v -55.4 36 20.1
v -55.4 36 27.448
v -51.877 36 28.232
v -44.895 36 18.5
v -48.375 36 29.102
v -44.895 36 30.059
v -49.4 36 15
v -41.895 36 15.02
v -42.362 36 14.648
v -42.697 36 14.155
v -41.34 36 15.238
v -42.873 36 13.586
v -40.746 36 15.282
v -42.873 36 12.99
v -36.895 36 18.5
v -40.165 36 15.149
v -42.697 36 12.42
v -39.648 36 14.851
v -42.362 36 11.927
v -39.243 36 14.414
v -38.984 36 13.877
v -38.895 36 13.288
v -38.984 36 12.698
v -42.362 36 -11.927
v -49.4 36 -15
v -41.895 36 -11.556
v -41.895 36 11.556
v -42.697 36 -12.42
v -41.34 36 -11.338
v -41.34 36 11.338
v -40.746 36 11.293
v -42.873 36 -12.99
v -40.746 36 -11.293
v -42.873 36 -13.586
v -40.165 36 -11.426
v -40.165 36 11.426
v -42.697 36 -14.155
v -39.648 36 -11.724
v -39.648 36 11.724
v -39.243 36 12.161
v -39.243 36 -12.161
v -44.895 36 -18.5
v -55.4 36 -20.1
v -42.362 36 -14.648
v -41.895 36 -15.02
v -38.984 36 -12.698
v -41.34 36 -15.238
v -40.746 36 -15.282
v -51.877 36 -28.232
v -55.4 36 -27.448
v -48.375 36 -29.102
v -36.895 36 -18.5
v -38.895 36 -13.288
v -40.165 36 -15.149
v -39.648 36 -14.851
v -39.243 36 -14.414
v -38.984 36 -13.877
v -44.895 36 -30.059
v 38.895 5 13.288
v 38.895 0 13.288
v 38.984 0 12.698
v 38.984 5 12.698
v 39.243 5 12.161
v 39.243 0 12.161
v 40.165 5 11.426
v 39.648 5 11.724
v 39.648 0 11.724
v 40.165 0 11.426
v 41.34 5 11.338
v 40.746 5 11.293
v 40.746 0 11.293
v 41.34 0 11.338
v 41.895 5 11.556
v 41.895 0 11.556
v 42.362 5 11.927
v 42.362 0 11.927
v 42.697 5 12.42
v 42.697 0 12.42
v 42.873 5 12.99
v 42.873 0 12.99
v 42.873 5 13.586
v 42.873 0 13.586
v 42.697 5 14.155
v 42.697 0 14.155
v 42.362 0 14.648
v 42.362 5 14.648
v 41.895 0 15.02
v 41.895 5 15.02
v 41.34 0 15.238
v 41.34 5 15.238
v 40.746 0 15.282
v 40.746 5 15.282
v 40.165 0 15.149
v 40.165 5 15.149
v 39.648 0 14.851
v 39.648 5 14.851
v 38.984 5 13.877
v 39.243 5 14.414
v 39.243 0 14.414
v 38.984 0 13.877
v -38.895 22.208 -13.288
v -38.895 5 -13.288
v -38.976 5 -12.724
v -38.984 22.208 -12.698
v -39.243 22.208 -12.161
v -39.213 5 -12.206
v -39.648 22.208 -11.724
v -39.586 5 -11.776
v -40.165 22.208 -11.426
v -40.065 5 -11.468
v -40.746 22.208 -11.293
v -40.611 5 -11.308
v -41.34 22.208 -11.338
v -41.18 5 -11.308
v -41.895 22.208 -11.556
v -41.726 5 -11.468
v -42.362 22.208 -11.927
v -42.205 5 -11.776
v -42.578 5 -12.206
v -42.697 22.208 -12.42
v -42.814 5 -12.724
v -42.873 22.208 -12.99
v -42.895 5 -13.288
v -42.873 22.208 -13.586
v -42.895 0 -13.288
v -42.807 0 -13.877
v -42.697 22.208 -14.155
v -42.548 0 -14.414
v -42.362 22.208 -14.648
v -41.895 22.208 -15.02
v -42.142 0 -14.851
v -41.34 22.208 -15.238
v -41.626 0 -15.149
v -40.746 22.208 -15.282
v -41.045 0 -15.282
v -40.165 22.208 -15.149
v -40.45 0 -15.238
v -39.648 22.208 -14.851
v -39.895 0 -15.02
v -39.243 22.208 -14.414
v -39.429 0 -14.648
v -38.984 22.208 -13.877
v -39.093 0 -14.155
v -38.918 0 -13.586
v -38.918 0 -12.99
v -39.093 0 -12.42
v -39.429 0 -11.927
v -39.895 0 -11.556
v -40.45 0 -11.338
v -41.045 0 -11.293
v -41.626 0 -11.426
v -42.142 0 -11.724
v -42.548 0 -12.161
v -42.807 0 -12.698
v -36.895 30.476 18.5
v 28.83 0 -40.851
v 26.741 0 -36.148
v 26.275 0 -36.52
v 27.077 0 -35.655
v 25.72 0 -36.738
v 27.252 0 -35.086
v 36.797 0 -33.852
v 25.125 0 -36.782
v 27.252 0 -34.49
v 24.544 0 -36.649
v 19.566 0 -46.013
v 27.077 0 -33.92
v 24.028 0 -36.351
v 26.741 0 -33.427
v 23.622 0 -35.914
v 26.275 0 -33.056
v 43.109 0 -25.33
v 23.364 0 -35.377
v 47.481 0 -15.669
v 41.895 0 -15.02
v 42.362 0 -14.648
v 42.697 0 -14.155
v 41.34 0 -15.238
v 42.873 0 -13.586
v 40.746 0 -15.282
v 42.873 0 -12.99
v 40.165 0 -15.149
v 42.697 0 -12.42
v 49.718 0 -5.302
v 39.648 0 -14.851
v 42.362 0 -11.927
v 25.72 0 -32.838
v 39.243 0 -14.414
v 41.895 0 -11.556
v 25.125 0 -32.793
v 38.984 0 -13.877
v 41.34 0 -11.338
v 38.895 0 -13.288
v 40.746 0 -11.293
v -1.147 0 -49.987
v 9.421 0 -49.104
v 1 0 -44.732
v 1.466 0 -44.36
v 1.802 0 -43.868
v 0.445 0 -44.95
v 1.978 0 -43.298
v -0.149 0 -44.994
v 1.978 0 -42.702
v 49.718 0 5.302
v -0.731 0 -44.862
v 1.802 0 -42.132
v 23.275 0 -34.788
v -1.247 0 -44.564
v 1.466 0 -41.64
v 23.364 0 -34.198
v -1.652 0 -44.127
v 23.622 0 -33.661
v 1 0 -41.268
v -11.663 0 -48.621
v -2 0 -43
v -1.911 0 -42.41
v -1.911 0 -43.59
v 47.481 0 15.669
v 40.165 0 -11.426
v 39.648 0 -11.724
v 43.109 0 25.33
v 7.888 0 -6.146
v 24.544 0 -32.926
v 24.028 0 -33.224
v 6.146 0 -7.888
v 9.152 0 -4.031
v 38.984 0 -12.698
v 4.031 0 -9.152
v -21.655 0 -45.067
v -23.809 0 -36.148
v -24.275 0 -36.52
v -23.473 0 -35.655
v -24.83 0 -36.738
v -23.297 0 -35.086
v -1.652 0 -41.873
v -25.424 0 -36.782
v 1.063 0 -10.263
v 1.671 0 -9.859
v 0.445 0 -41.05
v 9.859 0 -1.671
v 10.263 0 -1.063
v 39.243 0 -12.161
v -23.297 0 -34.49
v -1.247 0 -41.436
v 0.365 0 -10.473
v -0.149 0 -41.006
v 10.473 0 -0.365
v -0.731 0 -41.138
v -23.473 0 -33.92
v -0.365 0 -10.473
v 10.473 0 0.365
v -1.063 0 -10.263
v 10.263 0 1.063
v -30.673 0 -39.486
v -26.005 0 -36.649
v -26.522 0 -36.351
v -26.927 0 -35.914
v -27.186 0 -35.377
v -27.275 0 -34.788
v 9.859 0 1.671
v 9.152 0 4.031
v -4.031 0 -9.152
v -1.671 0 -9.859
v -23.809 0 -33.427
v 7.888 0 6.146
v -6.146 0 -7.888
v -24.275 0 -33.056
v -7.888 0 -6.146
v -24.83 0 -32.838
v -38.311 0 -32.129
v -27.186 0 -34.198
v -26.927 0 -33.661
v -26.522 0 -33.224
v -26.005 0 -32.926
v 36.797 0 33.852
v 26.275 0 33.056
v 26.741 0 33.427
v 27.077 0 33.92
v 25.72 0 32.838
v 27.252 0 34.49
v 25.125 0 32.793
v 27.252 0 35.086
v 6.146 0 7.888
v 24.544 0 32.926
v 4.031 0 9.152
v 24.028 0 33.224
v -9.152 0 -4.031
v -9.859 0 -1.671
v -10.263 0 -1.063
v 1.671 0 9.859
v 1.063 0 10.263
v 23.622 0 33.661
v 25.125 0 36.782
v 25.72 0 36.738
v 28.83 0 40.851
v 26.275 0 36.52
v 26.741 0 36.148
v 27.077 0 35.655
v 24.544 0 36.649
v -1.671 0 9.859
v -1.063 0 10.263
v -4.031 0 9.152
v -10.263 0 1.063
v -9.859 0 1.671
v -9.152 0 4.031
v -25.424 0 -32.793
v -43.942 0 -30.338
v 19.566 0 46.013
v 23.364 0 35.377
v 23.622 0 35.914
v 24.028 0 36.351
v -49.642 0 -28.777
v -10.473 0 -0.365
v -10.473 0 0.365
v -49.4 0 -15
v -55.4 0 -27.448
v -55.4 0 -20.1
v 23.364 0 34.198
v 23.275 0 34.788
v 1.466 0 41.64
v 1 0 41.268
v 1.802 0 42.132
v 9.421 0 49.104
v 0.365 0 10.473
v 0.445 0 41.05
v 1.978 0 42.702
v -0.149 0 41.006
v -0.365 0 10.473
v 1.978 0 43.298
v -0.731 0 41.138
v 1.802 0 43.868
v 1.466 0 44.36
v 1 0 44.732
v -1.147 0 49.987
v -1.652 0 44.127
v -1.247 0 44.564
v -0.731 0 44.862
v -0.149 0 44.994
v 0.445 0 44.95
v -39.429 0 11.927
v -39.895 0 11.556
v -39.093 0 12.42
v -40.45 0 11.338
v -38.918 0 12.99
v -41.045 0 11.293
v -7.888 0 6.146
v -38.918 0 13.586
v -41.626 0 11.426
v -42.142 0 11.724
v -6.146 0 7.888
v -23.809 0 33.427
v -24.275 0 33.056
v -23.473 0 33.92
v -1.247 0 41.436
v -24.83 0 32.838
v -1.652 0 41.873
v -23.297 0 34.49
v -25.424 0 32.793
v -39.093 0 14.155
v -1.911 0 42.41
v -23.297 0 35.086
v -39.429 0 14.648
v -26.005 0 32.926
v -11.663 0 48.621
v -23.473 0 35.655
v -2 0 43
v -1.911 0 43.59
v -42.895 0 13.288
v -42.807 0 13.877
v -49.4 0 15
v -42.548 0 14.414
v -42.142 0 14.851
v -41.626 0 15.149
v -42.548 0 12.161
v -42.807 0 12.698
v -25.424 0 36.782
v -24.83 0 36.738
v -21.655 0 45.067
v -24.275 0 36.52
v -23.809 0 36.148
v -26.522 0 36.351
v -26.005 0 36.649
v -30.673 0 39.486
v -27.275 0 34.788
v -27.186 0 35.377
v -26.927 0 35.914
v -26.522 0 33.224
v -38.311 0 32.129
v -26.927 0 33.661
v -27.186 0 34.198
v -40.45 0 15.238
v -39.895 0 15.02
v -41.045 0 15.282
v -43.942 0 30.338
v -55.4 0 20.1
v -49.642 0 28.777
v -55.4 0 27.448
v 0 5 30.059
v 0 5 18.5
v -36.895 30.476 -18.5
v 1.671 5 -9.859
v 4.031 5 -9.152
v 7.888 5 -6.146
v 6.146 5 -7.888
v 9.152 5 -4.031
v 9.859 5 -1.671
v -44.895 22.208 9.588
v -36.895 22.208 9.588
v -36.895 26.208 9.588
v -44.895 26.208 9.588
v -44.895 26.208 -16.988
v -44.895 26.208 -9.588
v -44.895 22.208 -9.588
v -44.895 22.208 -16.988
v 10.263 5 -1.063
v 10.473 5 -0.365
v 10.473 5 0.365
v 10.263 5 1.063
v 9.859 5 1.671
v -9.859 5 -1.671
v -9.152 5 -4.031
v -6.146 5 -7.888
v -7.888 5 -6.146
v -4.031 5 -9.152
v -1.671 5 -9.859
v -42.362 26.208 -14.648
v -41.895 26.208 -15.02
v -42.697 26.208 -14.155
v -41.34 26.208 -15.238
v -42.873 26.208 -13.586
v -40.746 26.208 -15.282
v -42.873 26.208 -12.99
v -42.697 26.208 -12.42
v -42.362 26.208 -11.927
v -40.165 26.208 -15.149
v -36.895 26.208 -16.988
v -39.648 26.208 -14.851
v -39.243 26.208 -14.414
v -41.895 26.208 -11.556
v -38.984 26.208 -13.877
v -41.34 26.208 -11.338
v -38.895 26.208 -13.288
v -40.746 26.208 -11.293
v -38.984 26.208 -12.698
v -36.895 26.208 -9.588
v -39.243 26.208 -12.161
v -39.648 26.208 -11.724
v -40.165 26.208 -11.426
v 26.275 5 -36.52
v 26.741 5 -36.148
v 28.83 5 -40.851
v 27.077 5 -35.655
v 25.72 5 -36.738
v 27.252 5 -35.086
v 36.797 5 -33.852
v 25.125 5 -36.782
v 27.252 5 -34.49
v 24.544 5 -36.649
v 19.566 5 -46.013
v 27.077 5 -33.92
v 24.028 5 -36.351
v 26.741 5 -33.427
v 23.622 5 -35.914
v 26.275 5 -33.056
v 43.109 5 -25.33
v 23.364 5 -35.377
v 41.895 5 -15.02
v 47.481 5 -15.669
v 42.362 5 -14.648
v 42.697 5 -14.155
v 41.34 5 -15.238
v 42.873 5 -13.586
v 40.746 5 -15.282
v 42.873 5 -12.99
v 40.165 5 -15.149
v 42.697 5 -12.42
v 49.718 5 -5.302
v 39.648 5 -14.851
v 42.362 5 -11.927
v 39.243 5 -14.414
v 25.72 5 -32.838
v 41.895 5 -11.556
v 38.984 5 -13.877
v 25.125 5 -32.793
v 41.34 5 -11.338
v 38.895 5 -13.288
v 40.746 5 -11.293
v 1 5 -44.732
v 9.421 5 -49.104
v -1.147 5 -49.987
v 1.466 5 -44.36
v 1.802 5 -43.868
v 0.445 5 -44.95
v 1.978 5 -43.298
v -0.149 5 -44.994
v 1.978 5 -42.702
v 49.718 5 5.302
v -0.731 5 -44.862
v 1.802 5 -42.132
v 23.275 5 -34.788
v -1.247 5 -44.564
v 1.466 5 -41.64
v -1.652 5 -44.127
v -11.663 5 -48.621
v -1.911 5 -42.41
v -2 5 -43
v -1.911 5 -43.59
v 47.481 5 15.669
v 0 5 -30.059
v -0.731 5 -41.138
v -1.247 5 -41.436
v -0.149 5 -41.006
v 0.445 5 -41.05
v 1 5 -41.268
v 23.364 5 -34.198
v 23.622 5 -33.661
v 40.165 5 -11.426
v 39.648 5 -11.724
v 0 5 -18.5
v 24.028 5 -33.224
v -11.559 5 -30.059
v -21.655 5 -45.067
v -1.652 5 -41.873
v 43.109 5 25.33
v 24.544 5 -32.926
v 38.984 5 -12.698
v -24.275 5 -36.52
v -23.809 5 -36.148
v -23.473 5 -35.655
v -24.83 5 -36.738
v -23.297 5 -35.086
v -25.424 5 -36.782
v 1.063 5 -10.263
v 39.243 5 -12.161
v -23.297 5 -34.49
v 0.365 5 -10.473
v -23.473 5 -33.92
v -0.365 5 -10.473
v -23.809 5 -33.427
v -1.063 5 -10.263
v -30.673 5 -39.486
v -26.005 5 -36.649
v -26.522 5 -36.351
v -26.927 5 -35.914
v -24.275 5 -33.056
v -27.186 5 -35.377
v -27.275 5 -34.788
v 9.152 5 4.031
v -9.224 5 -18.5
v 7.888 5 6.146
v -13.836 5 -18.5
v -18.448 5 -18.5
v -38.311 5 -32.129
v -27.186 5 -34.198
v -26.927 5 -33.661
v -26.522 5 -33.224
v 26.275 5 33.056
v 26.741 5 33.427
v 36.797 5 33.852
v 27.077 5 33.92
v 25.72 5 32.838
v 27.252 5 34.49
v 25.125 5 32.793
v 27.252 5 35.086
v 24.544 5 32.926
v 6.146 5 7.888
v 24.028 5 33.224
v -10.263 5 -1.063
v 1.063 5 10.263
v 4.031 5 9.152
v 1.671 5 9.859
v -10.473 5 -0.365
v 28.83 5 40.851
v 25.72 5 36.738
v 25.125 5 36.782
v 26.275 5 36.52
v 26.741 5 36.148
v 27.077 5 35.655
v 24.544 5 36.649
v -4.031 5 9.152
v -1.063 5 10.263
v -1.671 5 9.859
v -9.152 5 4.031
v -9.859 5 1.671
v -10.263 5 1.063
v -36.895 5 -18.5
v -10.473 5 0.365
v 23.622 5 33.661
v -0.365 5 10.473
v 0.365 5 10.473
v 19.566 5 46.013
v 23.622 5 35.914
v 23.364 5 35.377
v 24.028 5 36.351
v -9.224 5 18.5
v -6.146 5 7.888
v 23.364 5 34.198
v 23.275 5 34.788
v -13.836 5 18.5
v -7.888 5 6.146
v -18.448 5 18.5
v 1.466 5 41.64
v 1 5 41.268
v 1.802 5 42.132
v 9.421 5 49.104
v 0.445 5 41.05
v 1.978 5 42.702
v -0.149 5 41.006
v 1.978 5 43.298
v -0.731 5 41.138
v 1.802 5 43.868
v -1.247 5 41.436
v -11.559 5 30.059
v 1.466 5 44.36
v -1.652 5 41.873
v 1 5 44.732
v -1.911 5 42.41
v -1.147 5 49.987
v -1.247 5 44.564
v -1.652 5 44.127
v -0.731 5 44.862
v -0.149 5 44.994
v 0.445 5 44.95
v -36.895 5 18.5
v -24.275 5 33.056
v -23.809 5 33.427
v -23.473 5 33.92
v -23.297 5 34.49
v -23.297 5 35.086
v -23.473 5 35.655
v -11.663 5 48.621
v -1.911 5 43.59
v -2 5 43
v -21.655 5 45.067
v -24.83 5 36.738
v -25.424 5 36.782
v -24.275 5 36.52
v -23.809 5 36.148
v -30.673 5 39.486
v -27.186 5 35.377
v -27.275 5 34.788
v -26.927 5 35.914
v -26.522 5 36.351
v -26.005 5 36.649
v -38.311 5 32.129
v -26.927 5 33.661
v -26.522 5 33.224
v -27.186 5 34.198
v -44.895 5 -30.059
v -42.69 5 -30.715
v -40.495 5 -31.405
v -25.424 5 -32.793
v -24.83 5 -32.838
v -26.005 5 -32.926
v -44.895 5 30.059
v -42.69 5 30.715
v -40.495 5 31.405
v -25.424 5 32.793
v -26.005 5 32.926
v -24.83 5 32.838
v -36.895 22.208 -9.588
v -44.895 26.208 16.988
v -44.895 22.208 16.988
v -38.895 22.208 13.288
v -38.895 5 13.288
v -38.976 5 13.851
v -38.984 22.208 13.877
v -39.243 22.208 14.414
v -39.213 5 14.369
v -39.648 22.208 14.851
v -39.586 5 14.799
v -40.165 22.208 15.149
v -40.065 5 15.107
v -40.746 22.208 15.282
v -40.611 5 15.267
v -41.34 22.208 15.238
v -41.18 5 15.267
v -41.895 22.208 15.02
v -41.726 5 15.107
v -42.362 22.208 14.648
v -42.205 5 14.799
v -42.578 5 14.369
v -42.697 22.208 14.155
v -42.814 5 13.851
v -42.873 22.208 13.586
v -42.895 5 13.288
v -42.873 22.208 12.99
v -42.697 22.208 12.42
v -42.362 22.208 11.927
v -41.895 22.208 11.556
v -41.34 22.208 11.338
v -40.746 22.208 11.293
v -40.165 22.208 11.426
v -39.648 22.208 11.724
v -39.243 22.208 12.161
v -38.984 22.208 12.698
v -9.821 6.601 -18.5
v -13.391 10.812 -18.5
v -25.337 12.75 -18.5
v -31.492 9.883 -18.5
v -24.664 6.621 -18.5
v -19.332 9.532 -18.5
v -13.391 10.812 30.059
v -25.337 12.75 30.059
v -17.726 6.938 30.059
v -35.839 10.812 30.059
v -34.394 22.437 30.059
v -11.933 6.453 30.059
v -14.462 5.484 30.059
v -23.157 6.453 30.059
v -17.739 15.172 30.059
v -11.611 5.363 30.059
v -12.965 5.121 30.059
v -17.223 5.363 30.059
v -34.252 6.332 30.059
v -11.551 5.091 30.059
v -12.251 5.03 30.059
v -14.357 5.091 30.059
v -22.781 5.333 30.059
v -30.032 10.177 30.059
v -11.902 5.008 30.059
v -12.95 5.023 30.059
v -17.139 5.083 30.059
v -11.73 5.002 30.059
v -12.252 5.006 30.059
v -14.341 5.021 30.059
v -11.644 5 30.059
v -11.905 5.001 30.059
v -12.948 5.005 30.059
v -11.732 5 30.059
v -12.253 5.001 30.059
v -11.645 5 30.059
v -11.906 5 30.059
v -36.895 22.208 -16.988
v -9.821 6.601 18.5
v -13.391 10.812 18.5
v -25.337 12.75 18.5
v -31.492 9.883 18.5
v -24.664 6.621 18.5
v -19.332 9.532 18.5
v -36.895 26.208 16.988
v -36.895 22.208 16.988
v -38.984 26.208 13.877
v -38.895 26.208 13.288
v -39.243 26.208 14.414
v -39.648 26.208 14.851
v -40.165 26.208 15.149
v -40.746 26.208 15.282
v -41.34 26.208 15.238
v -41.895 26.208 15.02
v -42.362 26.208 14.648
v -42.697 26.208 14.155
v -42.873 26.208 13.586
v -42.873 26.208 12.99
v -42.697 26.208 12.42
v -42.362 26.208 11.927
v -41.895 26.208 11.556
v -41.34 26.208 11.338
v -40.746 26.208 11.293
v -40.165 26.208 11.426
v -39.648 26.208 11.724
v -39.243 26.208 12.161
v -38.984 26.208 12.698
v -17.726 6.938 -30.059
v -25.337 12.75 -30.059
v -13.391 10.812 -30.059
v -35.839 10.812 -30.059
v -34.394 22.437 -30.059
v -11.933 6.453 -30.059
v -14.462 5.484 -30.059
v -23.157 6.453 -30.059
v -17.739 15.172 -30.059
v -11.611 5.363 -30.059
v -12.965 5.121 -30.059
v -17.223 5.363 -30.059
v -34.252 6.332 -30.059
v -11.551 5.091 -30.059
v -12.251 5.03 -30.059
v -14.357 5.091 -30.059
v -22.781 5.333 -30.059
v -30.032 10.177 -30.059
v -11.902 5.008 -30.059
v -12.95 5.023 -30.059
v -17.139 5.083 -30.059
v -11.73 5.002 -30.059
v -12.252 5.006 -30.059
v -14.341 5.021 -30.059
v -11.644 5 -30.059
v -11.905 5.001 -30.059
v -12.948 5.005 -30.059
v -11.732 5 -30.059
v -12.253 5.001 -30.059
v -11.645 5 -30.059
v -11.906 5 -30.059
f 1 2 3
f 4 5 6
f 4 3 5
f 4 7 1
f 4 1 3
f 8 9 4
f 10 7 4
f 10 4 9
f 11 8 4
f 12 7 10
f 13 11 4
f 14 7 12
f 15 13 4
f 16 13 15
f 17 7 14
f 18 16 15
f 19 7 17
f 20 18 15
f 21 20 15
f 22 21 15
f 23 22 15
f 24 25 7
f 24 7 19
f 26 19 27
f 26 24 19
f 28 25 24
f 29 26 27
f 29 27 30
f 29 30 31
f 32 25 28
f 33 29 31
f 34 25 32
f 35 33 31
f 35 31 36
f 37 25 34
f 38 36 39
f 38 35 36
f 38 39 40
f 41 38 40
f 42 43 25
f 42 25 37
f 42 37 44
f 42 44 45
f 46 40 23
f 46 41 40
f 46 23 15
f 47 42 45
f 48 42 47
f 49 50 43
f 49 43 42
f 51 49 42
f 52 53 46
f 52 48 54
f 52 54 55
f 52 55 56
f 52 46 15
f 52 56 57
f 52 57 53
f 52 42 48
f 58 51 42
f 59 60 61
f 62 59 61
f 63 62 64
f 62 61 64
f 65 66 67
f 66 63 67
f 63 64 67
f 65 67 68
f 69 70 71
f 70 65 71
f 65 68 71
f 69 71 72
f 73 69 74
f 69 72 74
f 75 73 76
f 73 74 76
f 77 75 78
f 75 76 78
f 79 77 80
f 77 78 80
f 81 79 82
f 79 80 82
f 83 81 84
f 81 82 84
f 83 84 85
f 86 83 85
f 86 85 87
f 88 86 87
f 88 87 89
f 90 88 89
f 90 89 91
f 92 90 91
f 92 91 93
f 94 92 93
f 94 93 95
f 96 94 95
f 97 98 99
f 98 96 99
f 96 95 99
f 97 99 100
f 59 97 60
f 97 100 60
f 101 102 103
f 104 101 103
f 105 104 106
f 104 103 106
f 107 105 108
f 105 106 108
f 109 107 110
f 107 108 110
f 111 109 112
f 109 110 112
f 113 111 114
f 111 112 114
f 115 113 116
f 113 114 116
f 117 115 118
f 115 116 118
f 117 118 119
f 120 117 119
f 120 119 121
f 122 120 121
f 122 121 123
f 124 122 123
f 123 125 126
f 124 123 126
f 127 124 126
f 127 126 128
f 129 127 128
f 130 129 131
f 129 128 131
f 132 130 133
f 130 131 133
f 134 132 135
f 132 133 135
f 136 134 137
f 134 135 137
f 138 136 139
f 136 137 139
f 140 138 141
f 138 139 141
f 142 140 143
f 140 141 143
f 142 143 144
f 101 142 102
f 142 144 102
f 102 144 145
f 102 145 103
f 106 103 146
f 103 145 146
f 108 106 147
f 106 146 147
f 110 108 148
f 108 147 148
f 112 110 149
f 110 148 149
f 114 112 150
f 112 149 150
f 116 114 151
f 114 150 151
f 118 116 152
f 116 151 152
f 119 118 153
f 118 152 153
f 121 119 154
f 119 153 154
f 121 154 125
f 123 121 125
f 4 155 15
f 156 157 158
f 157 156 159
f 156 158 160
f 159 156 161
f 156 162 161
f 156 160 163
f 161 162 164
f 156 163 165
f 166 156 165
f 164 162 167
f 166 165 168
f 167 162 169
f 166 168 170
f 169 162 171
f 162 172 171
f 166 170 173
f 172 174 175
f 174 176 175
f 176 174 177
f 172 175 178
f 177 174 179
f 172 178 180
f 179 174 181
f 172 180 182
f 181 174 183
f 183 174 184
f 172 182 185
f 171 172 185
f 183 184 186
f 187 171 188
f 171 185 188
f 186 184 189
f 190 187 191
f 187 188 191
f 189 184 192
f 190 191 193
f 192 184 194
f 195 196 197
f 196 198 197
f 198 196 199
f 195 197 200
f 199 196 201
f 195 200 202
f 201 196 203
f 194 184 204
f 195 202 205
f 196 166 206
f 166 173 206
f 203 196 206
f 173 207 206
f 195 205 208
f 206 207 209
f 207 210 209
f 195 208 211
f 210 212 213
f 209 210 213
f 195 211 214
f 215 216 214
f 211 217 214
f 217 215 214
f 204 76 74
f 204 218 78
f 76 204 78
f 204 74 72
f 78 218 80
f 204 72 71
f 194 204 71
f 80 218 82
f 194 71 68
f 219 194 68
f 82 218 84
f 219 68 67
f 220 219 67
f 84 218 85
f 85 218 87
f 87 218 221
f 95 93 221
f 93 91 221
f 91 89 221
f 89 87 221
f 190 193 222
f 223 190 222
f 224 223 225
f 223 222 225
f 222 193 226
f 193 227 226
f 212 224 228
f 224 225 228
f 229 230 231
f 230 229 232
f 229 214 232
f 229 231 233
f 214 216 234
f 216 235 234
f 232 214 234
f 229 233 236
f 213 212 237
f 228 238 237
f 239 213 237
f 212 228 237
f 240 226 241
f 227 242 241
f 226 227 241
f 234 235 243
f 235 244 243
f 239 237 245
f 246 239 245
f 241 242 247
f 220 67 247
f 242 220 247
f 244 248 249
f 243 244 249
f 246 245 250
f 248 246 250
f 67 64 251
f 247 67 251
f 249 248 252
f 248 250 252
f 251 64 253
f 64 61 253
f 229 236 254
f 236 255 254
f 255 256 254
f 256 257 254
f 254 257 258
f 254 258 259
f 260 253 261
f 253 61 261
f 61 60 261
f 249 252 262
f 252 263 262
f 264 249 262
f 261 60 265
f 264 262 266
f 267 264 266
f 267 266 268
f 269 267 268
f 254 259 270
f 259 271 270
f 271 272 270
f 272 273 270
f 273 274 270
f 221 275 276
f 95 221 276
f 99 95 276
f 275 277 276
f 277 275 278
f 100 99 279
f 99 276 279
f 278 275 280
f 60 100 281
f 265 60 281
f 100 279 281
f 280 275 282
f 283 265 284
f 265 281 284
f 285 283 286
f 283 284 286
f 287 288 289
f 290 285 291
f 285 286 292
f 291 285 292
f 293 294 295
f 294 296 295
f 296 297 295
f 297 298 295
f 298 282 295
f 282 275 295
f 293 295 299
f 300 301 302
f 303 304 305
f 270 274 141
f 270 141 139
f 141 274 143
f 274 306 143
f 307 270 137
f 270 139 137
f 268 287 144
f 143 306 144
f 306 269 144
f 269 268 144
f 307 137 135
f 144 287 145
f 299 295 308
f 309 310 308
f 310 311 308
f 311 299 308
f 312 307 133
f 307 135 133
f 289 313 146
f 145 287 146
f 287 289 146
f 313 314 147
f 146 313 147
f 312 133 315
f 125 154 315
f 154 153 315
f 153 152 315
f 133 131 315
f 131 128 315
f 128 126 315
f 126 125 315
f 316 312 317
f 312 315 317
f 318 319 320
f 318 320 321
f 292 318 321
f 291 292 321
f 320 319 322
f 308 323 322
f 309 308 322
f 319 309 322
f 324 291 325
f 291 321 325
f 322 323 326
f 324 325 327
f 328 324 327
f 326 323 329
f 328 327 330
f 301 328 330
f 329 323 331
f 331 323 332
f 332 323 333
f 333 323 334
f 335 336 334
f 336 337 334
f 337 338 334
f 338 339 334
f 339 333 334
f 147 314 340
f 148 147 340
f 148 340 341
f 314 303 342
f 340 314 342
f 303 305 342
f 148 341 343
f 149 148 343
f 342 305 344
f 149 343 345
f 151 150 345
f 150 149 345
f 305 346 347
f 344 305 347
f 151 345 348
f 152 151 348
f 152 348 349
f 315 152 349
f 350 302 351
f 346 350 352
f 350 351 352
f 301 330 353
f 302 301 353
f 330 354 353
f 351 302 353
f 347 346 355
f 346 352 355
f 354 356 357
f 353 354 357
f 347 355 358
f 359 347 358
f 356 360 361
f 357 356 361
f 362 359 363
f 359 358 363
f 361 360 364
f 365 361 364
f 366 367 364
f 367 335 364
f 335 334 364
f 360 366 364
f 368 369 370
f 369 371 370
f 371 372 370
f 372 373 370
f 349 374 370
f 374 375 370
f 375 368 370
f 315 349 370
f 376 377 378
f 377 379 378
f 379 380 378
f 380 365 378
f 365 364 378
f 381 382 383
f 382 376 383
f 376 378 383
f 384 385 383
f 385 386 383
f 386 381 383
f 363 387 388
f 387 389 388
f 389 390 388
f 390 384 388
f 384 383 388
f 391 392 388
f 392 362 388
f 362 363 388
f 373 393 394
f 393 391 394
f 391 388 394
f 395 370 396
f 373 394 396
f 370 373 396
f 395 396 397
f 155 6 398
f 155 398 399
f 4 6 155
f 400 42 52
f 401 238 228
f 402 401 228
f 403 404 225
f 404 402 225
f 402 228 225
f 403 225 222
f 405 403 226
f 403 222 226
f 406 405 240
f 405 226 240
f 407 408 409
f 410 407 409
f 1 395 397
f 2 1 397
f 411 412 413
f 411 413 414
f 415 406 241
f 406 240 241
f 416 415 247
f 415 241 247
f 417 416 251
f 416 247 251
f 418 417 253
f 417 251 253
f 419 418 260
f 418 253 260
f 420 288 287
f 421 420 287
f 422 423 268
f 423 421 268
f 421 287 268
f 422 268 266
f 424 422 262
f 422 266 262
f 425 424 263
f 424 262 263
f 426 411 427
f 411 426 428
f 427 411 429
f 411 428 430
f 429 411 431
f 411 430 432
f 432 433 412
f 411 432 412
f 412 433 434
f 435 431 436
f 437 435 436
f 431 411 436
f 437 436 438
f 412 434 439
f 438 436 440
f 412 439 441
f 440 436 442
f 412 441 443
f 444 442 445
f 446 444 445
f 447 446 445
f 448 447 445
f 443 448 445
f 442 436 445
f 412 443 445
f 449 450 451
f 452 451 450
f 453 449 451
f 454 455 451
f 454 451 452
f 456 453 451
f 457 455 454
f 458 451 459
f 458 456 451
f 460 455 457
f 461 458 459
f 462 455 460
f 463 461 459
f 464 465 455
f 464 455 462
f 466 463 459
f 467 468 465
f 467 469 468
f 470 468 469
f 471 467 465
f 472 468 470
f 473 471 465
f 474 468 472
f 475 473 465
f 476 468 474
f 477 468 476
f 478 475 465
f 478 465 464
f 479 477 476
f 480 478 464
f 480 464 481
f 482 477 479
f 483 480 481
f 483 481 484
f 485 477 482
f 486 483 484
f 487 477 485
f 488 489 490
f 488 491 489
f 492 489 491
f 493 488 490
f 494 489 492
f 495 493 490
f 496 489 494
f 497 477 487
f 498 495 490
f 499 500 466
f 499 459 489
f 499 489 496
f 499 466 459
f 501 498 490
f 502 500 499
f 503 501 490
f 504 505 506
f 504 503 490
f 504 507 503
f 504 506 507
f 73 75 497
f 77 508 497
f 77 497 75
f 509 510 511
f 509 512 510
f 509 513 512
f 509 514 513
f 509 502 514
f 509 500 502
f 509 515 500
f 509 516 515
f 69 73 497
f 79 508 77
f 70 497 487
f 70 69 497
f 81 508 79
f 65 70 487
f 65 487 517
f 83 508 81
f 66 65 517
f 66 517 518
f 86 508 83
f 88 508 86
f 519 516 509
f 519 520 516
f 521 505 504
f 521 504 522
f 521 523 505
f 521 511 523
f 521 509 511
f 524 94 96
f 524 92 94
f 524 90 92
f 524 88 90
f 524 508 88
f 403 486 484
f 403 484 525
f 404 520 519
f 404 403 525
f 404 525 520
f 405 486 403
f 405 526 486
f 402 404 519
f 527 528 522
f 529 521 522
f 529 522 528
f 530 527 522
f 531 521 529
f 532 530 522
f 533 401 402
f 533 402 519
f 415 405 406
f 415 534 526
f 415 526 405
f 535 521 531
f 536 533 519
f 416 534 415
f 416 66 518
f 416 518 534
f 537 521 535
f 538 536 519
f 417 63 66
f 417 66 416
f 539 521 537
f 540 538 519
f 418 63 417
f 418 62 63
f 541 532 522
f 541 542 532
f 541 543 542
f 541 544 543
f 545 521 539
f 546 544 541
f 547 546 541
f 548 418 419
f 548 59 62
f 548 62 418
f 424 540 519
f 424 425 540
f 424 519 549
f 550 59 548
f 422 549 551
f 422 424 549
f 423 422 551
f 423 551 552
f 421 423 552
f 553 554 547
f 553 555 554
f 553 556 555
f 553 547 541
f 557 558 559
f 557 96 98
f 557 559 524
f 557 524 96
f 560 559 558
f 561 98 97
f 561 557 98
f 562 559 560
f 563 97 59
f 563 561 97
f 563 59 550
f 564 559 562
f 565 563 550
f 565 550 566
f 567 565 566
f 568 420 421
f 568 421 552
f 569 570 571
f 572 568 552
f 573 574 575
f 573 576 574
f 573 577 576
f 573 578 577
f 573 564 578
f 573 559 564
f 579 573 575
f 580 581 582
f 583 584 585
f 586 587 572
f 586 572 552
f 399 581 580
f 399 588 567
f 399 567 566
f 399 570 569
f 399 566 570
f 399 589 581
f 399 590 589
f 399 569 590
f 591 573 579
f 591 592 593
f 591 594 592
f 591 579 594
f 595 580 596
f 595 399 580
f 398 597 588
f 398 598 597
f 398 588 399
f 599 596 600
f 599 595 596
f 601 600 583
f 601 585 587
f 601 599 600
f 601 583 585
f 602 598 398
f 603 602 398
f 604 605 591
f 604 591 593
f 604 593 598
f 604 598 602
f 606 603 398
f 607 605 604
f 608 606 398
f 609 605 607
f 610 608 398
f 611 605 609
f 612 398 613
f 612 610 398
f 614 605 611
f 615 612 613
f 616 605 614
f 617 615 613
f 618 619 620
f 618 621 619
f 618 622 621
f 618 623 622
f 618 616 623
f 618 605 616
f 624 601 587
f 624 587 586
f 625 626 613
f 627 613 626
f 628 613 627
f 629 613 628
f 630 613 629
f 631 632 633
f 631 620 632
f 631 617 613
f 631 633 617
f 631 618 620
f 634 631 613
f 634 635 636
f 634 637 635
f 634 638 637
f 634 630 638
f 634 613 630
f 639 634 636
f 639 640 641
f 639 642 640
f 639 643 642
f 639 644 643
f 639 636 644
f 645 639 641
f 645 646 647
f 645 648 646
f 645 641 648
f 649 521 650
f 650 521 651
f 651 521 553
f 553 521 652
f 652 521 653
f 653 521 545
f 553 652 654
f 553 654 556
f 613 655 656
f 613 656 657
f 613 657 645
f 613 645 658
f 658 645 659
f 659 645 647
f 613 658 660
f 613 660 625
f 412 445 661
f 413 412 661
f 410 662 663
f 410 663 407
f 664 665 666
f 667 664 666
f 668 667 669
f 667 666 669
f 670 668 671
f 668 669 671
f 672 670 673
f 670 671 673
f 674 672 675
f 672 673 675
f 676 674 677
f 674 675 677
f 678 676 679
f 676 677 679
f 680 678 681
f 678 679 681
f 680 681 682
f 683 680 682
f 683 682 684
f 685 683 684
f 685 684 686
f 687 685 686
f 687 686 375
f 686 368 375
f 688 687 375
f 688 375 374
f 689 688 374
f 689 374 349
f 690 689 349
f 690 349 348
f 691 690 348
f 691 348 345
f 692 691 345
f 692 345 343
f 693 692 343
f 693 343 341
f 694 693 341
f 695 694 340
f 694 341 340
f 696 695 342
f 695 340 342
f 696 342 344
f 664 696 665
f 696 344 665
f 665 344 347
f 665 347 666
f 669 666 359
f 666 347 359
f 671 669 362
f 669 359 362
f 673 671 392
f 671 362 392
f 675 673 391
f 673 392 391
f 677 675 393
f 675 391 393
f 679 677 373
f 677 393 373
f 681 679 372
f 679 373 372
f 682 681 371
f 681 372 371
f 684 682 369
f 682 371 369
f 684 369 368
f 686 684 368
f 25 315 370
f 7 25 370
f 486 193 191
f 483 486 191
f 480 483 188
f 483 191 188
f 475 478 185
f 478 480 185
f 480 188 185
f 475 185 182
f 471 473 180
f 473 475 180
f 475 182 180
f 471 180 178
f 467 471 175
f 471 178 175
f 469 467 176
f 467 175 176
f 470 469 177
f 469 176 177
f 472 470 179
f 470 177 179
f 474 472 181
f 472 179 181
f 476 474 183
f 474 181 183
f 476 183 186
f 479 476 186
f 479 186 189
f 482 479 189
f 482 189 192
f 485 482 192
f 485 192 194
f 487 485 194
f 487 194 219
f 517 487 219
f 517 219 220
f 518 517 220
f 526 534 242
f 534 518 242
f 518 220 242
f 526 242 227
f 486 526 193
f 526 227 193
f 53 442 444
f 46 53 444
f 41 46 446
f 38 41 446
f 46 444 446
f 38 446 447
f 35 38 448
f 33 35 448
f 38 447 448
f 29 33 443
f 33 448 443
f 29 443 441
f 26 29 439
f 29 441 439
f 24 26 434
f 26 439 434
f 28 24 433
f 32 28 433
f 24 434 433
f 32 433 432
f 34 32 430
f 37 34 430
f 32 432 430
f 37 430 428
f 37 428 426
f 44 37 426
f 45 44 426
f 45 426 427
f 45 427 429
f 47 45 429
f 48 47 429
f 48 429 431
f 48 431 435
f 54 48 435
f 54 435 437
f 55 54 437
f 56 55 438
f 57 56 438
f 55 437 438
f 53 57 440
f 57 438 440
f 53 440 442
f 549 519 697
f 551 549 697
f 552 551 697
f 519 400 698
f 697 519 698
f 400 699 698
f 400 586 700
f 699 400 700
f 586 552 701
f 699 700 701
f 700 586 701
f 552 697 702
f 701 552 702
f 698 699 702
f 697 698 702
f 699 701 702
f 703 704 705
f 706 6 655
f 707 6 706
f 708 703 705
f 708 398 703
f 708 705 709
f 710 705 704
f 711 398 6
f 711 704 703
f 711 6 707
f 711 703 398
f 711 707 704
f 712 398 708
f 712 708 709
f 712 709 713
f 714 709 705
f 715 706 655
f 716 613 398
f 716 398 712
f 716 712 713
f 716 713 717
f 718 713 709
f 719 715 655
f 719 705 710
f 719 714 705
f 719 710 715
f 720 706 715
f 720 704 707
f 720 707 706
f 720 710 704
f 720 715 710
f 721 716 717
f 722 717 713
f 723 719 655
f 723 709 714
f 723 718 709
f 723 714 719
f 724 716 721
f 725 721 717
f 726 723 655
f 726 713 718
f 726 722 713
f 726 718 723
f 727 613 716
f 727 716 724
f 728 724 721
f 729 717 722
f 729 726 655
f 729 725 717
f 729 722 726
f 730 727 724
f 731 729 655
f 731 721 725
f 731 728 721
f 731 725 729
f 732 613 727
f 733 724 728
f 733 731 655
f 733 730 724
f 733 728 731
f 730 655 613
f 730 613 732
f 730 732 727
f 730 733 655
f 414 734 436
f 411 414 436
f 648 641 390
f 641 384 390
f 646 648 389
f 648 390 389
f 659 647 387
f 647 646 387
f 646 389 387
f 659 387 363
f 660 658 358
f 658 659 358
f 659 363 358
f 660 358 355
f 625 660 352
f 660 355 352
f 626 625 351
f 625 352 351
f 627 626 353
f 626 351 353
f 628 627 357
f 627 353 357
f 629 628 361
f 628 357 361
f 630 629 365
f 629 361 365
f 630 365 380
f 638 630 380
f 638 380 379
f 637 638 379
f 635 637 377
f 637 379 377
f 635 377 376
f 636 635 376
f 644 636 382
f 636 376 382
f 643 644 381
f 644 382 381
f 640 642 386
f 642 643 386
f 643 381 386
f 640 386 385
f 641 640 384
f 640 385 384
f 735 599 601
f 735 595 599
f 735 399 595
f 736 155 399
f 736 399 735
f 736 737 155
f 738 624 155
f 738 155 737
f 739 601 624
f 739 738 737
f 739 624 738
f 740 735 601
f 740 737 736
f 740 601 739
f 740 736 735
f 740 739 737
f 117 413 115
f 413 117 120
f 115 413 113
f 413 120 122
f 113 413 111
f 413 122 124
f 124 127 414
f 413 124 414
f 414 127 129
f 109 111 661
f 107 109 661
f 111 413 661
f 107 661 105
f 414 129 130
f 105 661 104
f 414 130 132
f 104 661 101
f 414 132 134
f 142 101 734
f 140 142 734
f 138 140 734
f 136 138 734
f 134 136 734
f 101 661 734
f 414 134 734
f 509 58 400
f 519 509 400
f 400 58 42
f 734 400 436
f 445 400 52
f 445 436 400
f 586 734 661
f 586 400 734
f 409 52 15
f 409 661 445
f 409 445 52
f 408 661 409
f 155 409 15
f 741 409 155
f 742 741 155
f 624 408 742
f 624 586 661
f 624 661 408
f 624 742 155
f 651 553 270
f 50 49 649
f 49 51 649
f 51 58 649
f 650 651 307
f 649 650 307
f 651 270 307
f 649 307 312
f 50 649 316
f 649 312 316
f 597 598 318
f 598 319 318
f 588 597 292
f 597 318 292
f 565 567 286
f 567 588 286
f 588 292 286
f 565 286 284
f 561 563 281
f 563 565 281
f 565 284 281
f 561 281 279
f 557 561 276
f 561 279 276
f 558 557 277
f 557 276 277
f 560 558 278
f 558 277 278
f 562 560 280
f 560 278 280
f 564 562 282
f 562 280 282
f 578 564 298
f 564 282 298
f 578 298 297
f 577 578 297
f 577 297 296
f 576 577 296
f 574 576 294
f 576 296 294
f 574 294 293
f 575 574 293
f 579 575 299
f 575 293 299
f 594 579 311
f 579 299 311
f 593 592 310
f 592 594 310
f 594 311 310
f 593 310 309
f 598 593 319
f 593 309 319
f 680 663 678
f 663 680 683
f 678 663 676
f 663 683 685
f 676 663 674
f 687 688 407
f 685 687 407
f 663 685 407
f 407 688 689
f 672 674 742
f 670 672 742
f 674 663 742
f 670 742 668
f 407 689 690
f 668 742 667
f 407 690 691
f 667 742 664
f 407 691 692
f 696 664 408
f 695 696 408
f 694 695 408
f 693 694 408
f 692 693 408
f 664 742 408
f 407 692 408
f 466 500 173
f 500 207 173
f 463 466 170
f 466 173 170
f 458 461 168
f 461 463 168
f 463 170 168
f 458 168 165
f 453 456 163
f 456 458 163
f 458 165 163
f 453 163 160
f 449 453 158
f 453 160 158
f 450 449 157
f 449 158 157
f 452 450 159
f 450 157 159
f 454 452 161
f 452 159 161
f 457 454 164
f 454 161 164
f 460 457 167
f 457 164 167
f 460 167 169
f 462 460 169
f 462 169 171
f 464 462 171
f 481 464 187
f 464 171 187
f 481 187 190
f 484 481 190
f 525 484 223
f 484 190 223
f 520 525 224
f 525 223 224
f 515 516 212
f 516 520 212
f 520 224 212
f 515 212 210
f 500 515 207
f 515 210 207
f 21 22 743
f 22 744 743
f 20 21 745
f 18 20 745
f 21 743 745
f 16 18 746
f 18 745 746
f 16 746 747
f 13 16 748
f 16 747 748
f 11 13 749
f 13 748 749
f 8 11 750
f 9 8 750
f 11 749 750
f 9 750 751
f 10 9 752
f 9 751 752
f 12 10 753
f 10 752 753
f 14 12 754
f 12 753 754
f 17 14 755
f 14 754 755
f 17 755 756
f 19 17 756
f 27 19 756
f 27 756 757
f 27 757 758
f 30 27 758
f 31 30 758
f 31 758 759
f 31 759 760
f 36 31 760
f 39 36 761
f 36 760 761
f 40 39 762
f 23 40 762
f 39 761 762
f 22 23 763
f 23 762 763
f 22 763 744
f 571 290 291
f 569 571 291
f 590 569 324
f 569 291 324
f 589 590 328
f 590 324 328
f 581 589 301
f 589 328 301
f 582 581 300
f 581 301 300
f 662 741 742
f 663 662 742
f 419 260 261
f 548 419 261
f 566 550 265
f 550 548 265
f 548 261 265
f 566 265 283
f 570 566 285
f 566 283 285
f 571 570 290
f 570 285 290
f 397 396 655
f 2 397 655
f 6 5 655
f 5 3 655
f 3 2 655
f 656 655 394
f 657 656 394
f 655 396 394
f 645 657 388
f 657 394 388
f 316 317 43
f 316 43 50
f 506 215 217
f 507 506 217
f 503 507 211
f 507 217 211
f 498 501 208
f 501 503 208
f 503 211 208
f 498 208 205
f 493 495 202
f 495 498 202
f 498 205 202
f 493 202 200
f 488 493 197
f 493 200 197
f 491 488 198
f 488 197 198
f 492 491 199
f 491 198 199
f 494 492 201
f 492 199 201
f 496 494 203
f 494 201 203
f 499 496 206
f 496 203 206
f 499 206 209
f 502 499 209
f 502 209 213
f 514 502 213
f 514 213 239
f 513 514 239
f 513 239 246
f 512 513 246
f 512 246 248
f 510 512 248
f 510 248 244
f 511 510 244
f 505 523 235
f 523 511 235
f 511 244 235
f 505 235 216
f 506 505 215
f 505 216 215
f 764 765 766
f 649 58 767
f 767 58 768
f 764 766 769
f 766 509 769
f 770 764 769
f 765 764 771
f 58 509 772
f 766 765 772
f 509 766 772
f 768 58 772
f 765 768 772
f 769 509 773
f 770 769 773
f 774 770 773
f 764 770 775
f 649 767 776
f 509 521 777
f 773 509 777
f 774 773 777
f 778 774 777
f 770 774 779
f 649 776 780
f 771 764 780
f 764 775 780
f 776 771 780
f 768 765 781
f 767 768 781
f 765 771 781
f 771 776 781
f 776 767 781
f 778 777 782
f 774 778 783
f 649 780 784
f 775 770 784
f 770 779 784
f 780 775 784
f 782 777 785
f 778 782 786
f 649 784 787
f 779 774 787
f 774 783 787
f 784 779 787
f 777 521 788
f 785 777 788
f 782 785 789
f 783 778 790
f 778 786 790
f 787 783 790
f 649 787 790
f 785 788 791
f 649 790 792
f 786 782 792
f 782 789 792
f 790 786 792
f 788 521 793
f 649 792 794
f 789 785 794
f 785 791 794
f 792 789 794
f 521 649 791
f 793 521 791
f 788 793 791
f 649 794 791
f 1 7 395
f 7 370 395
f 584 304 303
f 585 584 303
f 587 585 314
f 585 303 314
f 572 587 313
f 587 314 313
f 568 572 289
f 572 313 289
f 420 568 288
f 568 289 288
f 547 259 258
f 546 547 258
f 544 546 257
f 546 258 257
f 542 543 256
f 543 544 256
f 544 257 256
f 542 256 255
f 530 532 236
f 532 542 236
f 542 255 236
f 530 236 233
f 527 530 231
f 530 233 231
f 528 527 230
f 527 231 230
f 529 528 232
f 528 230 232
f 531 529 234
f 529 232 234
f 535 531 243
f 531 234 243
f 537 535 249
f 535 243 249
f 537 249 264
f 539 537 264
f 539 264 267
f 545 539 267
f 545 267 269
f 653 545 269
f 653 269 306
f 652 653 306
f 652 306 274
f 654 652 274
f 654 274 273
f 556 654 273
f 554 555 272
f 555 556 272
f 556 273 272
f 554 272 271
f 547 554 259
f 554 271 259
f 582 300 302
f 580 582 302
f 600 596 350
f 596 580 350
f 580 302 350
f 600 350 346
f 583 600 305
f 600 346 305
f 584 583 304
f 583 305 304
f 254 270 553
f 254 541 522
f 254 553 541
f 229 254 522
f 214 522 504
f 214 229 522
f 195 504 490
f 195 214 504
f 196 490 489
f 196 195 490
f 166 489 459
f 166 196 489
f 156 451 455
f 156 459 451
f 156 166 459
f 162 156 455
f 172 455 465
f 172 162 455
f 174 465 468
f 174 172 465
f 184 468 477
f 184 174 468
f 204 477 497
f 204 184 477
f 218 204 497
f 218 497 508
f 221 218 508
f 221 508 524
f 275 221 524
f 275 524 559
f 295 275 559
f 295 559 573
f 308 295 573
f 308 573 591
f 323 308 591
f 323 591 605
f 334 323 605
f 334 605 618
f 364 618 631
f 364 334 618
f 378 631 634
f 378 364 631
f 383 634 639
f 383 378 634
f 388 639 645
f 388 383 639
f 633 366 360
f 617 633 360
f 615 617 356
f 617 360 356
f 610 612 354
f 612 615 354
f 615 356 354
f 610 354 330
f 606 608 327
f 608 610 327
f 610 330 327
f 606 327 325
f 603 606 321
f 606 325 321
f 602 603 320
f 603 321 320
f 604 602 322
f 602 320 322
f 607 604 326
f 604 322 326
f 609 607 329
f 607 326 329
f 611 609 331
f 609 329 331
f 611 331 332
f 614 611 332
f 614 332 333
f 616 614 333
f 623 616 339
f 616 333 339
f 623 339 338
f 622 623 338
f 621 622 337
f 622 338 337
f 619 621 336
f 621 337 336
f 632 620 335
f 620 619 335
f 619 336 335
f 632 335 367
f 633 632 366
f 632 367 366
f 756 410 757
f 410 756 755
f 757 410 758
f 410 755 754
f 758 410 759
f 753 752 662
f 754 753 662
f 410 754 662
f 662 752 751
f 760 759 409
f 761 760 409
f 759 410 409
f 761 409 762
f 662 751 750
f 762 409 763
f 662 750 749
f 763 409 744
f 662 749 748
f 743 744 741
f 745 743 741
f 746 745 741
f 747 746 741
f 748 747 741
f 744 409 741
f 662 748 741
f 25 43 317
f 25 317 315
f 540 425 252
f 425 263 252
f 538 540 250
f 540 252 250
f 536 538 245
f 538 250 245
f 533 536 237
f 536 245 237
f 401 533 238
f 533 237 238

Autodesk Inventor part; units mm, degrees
ref_plane "YZ Plane" through (0, 0, 0) normal (1, 0, 0) x (0, 1, 0)
ref_plane "XZ Plane" through (0, 0, 0) normal (0, 1, 0) x (-1, 0, 0)
sketch "Эскиз12" plane through (0, 0, 0) normal (0, 1, 0) x (-1, 0, 0)
  line L0 (114.5, 15) -> (114.5, 11.5)
  line L1 (114.5, 11.5) -> (114.5, -11.5)
  line L2 (114.5, -11.5) -> (114.5, -15)
  line L3 (114.5, -15) -> (108.5, -20.1)
  line L4 (108.5, -20.1) -> (55.4, -20.1)
  line L5 (55.4, -20.1) -> (49.4, -15)
  line L6 (49.4, -15) -> (49.4, 15)
  line L7 (49.4, 15) -> (55.4, 20.1)
  line L8 (55.4, 20.1) -> (108.5, 20.1)
  line L9 (108.5, 20.1) -> (114.5, 15)
  arc A0 (-1.6711, 9.8594) -> (-9.8594, 1.6711) centre (0, 0) ccw
  arc A1 (1.6711, 9.8594) -> (-1.6711, 9.8594) centre (0, 8) ccw
  arc A2 (9.8594, 1.6711) -> (1.6711, 9.8594) centre (0, 0) ccw
  arc A3 (9.8594, -1.6711) -> (9.8594, 1.6711) centre (8, 0) ccw
  arc A4 (1.6711, -9.8594) -> (9.8594, -1.6711) centre (0, 0) ccw
  arc A5 (-1.6711, -9.8594) -> (1.6711, -9.8594) centre (0, -8) ccw
  arc A6 (-9.8594, -1.6711) -> (-1.6711, -9.8594) centre (0, 0) ccw
  arc A7 (-9.8594, 1.6711) -> (-9.8594, -1.6711) centre (-8, 0) ccw
  circle A8 centre (0, 43) radius 2
  circle A9 centre (-25.2748, 34.7877) radius 2
  circle A10 centre (-40.8954, 13.2877) radius 2
  circle A11 centre (-40.8954, -13.2877) radius 2
  circle A12 centre (-25.2748, -34.7877) radius 2
  circle A13 centre (0, -43) radius 2
  circle A14 centre (25.2748, -34.7877) radius 2
  circle A15 centre (40.8954, -13.2877) radius 2
  circle A16 centre (40.8954, 13.2877) radius 2
  circle A17 centre (25.2748, 34.7877) radius 2
  arc A18 (38.3107, 32.1293) -> (38.3107, -32.1293) centre (0, 0) ccw
  arc A19 (97.8335, -24.9059) -> (38.3107, -32.1293) centre (85.2244, -169.8586) ccw
  arc A20 (97.8335, -24.9059) -> (97.8335, 24.9059) centre (100, 0) ccw
  arc A21 (38.3107, 32.1293) -> (97.8335, 24.9059) centre (85.2244, 169.8586) ccw
  circle A22 centre (52.2, 11) radius 1.025
  circle A23 centre (52.2, -11) radius 1.025
  circle A24 centre (60, -17.3) radius 1.025
  circle A25 centre (60, 17.3) radius 1.025
  line L10 (55, -11.5) -> (55, 11.5)
  arc A26 (58, 14.5) -> (55, 11.5) centre (58, 11.5) ccw
  line L11 (58, 14.5) -> (111.5, 14.5)
  arc A27 (55, -11.5) -> (58, -14.5) centre (58, -11.5) ccw
  line L12 (111.5, -14.5) -> (58, -14.5)
  arc A28 (111.5, -14.5) -> (114.5, -11.5) centre (111.5, -11.5) ccw
  arc A29 (114.5, 11.5) -> (111.5, 14.5) centre (111.5, 11.5) ccw
  line L13 (40.8954, 13.2877) -> (40.8954, -13.2877)
  line L14 (36.8954, 18.5) -> (44.8954, 18.5)
  line L15 (44.8954, 18.5) -> (44.8954, -18.5)
  line L16 (44.8954, -18.5) -> (36.8954, -18.5)
  line L17 (36.8954, -18.5) -> (36.8954, 18.5)
  line L18 (36.8954, 18.5) -> (44.8954, -18.5) construction
  line L19 (44.8954, 18.5) -> (36.8954, -18.5) construction
  line L20 (44.8954, -18.5) -> (44.8954, -30.0593)
  line L21 (55.4, -20.1) -> (55.4, -27.448)
  line L22 (55.4, 20.1) -> (55.4, 27.448)
  line L23 (44.8954, 18.5) -> (44.8954, 30.0593)
  point P0 (40.8954, 0)
  dimension "d45" = 8
  dimension "d46" = 37
extrude "Выдавливание9" add sketch "Эскиз12" along normal blind 5 contours L7 L6 L5 L21 A19 L20 L15 L23 A21 L22 | L23 L14 L17 L16 L20 A19 A18 A21 | L15 L16 L17 L14
sketch "Эскиз13" plane through (0, 5, 0) normal (0, 1, 0) x (1, 0, 0)
  line L0 (-114.5, -15) -> (-114.5, -11.5)
  line L1 (-114.5, -11.5) -> (-114.5, 11.5)
  line L2 (-114.5, 11.5) -> (-114.5, 15)
  line L3 (-114.5, 15) -> (-108.5, 20.1)
  line L4 (-108.5, 20.1) -> (-55.4, 20.1)
  line L5 (-55.4, 20.1) -> (-49.4, 15)
  line L6 (-49.4, 15) -> (-49.4, -15)
  line L7 (-49.4, -15) -> (-55.4, -20.1)
  line L8 (-55.4, -20.1) -> (-108.5, -20.1)
  line L9 (-108.5, -20.1) -> (-114.5, -15)
  arc A0 (1.6711, -9.8594) -> (9.8594, -1.6711) centre (0, 0) ccw
  arc A1 (-1.6711, -9.8594) -> (1.6711, -9.8594) centre (0, -8) ccw
  arc A2 (-9.8594, -1.6711) -> (-1.6711, -9.8594) centre (0, 0) ccw
  arc A3 (-9.8594, 1.6711) -> (-9.8594, -1.6711) centre (-8, 0) ccw
  arc A4 (-1.6711, 9.8594) -> (-9.8594, 1.6711) centre (0, 0) ccw
  arc A5 (1.6711, 9.8594) -> (-1.6711, 9.8594) centre (0, 8) ccw
  arc A6 (9.8594, 1.6711) -> (1.6711, 9.8594) centre (0, 0) ccw
  arc A7 (9.8594, -1.6711) -> (9.8594, 1.6711) centre (8, 0) ccw
  circle A8 centre (0, -43) radius 2
  circle A9 centre (25.2748, -34.7877) radius 2
  circle A10 centre (40.8954, -13.2877) radius 2
  circle A11 centre (40.8954, 13.2877) radius 2
  circle A12 centre (25.2748, 34.7877) radius 2
  circle A13 centre (0, 43) radius 2
  circle A14 centre (-25.2748, 34.7877) radius 2
  circle A15 centre (-40.8954, 13.2877) radius 2
  circle A16 centre (-40.8954, -13.2877) radius 2
  circle A17 centre (-25.2748, -34.7877) radius 2
  arc A18 (-38.3107, -32.1293) -> (-38.3107, 32.1293) centre (0, 0) ccw
  arc A19 (-97.8335, 24.9059) -> (-38.3107, 32.1293) centre (-85.2244, 169.8586) ccw
  arc A20 (-97.8335, 24.9059) -> (-97.8335, -24.9059) centre (-100, 0) ccw
  arc A21 (-38.3107, -32.1293) -> (-97.8335, -24.9059) centre (-85.2244, -169.8586) ccw
  circle A22 centre (-52.2, -11) radius 1.025
  circle A23 centre (-52.2, 11) radius 1.025
  circle A24 centre (-60, 17.3) radius 1.025
  circle A25 centre (-60, -17.3) radius 1.025
  line L10 (-55, 11.5) -> (-55, -11.5)
  arc A26 (-58, -14.5) -> (-55, -11.5) centre (-58, -11.5) ccw
  line L11 (-58, -14.5) -> (-111.5, -14.5)
  arc A27 (-55, 11.5) -> (-58, 14.5) centre (-58, 11.5) ccw
  line L12 (-111.5, 14.5) -> (-58, 14.5)
  arc A28 (-111.5, 14.5) -> (-114.5, 11.5) centre (-111.5, 11.5) ccw
  arc A29 (-114.5, -11.5) -> (-111.5, -14.5) centre (-111.5, -11.5) ccw
  line L13 (-40.8954, -13.2877) -> (-40.8954, 13.2877)
  line L14 (-36.8954, -18.5) -> (-44.8954, -18.5)
  line L15 (-44.8954, -18.5) -> (-44.8954, 18.5)
  line L16 (-44.8954, 18.5) -> (-36.8954, 18.5)
  line L17 (-36.8954, 18.5) -> (-36.8954, -18.5)
  line L18 (-36.8954, -18.5) -> (-44.8954, 18.5) construction
  line L19 (-44.8954, -18.5) -> (-36.8954, 18.5) construction
  line L20 (-44.8954, 18.5) -> (-44.8954, 30.0593)
  line L21 (-55.4, 20.1) -> (-55.4, 27.448)
  line L22 (-55.4, -20.1) -> (-55.4, -27.448)
  line L23 (-44.8954, -18.5) -> (-44.8954, -30.0593)
  point P0 (0, 0)
  point P1 (-40.8954, 0)
  dimension "d49" = 8
  dimension "d50" = 37
extrude "Выдавливание10" add sketch "Эскиз13" along normal blind 31 contours L7 L6 L5 L21 A19 L20 L15 L23 A21 L22 | L15 L16 L17 L14
sketch "Эскиз14" plane through (-36.8954, 5, 18.5) normal (1, 0, 0) x (0, 0, -1)
  line L0 (3.2123, 0) -> (3.2123, 31) projected
  line L1 (7.2123, 0) -> (7.2123, 31) projected
  line L2 (29.7877, 0) -> (29.7877, 31) projected
  line L3 (33.7877, 0) -> (33.7877, 31) projected
  line L4 (3.2123, 19.2083) -> (7.2123, 19.2083)
  line L5 (1.5123, 17.2083) -> (8.9123, 17.2083)
  line L6 (8.9123, 17.2083) -> (8.9123, 21.2083)
  line L7 (8.9123, 21.2083) -> (1.5123, 21.2083)
  line L8 (1.5123, 21.2083) -> (1.5123, 17.2083)
  line L9 (1.5123, 17.2083) -> (8.9123, 21.2083) construction
  line L10 (8.9123, 17.2083) -> (1.5123, 21.2083) construction
  line L11 (29.7877, 19.2083) -> (33.7877, 19.2083)
  line L12 (28.0877, 17.2083) -> (35.4877, 17.2083)
  line L13 (35.4877, 17.2083) -> (35.4877, 21.2083)
  line L14 (35.4877, 21.2083) -> (28.0877, 21.2083)
  line L15 (28.0877, 21.2083) -> (28.0877, 17.2083)
  line L16 (28.0877, 17.2083) -> (35.4877, 21.2083) construction
  line L17 (35.4877, 17.2083) -> (28.0877, 21.2083) construction
  point P0 (5.2123, 19.2083)
  point P1 (31.7877, 19.2083)
  dimension "d53" = 7.4
  dimension "d54" = 4
  dimension "d55" = 7.4
  dimension "d56" = 4
extrude "Выдавливание11" cut sketch "Эскиз14" against normal blind 8
sketch "Эскиз16" plane through (0, 5, 0) normal (0, 1, 0) x (1, 0, 0)
  line L0 (0, -18.5) -> (-11.559, -18.5)
  line L1 (-11.559, -18.5) -> (-11.559, -30.059)
  line L2 (-11.559, -30.059) -> (0, -30.059)
  line L3 (0, -30.059) -> (0, -18.5)
  point P0 (0, 0)
  point P1 (-5.7795, -24.2795)
  dimension "d60" = 11.559
  dimension "d61" = 11.559
loft "Лофт1" add profiles "Эскиз16" section 2 edges at (-44.8954, 20.5, 18.5) (-44.8954, 36, 24.2797) (-44.8954, 20.5, 30.0593) (-44.8954, 5, 24.2797)
ref_plane "РабПлоскость2" through (-36.8954, 36, 0) normal (0, 0, -1) x (-1, 0, 0)
mirror "Зеркальное отражение2" about plane through (-36.8954, 36, 0) normal (0, 0, -1) of "Лофт1"
sketch "Эскиз17" plane through (0, 36, 0) normal (0, 1, 0) x (1, 0, 0)
  circle A0 centre (-40.8954, -13.2877) radius 2 projected
  circle A1 centre (-40.8954, 13.2877) radius 2 projected
  line L0 (-36.8954, -18.5) -> (-36.8954, 18.5) projected
  line L1 (-36.8954, 18.5) -> (-44.8954, 18.5) projected
  line L2 (-44.8954, 18.5) -> (-44.8954, 30.0593) projected
  arc A2 (-55.4, 27.448) -> (-44.8954, 30.0593) centre (-85.2244, 169.8586) ccw projected
  line L3 (-55.4, 27.448) -> (-55.4, 20.1) projected
  line L4 (-55.4, 20.1) -> (-49.4, 15) projected
  line L5 (-49.4, 15) -> (-49.4, -15) projected
  line L6 (-49.4, -15) -> (-55.4, -20.1) projected
  line L7 (-55.4, -20.1) -> (-55.4, -27.448) projected
  arc A3 (-44.8954, -30.0593) -> (-55.4, -27.448) centre (-85.2244, -169.8586) ccw projected
  line L8 (-44.8954, -30.0593) -> (-44.8954, -18.5) projected
  line L9 (-44.8954, -18.5) -> (-36.8954, -18.5) projected
  point P0 (0, 0)
properties part number "000.302 - Кожух" material "Пластик АБС"
